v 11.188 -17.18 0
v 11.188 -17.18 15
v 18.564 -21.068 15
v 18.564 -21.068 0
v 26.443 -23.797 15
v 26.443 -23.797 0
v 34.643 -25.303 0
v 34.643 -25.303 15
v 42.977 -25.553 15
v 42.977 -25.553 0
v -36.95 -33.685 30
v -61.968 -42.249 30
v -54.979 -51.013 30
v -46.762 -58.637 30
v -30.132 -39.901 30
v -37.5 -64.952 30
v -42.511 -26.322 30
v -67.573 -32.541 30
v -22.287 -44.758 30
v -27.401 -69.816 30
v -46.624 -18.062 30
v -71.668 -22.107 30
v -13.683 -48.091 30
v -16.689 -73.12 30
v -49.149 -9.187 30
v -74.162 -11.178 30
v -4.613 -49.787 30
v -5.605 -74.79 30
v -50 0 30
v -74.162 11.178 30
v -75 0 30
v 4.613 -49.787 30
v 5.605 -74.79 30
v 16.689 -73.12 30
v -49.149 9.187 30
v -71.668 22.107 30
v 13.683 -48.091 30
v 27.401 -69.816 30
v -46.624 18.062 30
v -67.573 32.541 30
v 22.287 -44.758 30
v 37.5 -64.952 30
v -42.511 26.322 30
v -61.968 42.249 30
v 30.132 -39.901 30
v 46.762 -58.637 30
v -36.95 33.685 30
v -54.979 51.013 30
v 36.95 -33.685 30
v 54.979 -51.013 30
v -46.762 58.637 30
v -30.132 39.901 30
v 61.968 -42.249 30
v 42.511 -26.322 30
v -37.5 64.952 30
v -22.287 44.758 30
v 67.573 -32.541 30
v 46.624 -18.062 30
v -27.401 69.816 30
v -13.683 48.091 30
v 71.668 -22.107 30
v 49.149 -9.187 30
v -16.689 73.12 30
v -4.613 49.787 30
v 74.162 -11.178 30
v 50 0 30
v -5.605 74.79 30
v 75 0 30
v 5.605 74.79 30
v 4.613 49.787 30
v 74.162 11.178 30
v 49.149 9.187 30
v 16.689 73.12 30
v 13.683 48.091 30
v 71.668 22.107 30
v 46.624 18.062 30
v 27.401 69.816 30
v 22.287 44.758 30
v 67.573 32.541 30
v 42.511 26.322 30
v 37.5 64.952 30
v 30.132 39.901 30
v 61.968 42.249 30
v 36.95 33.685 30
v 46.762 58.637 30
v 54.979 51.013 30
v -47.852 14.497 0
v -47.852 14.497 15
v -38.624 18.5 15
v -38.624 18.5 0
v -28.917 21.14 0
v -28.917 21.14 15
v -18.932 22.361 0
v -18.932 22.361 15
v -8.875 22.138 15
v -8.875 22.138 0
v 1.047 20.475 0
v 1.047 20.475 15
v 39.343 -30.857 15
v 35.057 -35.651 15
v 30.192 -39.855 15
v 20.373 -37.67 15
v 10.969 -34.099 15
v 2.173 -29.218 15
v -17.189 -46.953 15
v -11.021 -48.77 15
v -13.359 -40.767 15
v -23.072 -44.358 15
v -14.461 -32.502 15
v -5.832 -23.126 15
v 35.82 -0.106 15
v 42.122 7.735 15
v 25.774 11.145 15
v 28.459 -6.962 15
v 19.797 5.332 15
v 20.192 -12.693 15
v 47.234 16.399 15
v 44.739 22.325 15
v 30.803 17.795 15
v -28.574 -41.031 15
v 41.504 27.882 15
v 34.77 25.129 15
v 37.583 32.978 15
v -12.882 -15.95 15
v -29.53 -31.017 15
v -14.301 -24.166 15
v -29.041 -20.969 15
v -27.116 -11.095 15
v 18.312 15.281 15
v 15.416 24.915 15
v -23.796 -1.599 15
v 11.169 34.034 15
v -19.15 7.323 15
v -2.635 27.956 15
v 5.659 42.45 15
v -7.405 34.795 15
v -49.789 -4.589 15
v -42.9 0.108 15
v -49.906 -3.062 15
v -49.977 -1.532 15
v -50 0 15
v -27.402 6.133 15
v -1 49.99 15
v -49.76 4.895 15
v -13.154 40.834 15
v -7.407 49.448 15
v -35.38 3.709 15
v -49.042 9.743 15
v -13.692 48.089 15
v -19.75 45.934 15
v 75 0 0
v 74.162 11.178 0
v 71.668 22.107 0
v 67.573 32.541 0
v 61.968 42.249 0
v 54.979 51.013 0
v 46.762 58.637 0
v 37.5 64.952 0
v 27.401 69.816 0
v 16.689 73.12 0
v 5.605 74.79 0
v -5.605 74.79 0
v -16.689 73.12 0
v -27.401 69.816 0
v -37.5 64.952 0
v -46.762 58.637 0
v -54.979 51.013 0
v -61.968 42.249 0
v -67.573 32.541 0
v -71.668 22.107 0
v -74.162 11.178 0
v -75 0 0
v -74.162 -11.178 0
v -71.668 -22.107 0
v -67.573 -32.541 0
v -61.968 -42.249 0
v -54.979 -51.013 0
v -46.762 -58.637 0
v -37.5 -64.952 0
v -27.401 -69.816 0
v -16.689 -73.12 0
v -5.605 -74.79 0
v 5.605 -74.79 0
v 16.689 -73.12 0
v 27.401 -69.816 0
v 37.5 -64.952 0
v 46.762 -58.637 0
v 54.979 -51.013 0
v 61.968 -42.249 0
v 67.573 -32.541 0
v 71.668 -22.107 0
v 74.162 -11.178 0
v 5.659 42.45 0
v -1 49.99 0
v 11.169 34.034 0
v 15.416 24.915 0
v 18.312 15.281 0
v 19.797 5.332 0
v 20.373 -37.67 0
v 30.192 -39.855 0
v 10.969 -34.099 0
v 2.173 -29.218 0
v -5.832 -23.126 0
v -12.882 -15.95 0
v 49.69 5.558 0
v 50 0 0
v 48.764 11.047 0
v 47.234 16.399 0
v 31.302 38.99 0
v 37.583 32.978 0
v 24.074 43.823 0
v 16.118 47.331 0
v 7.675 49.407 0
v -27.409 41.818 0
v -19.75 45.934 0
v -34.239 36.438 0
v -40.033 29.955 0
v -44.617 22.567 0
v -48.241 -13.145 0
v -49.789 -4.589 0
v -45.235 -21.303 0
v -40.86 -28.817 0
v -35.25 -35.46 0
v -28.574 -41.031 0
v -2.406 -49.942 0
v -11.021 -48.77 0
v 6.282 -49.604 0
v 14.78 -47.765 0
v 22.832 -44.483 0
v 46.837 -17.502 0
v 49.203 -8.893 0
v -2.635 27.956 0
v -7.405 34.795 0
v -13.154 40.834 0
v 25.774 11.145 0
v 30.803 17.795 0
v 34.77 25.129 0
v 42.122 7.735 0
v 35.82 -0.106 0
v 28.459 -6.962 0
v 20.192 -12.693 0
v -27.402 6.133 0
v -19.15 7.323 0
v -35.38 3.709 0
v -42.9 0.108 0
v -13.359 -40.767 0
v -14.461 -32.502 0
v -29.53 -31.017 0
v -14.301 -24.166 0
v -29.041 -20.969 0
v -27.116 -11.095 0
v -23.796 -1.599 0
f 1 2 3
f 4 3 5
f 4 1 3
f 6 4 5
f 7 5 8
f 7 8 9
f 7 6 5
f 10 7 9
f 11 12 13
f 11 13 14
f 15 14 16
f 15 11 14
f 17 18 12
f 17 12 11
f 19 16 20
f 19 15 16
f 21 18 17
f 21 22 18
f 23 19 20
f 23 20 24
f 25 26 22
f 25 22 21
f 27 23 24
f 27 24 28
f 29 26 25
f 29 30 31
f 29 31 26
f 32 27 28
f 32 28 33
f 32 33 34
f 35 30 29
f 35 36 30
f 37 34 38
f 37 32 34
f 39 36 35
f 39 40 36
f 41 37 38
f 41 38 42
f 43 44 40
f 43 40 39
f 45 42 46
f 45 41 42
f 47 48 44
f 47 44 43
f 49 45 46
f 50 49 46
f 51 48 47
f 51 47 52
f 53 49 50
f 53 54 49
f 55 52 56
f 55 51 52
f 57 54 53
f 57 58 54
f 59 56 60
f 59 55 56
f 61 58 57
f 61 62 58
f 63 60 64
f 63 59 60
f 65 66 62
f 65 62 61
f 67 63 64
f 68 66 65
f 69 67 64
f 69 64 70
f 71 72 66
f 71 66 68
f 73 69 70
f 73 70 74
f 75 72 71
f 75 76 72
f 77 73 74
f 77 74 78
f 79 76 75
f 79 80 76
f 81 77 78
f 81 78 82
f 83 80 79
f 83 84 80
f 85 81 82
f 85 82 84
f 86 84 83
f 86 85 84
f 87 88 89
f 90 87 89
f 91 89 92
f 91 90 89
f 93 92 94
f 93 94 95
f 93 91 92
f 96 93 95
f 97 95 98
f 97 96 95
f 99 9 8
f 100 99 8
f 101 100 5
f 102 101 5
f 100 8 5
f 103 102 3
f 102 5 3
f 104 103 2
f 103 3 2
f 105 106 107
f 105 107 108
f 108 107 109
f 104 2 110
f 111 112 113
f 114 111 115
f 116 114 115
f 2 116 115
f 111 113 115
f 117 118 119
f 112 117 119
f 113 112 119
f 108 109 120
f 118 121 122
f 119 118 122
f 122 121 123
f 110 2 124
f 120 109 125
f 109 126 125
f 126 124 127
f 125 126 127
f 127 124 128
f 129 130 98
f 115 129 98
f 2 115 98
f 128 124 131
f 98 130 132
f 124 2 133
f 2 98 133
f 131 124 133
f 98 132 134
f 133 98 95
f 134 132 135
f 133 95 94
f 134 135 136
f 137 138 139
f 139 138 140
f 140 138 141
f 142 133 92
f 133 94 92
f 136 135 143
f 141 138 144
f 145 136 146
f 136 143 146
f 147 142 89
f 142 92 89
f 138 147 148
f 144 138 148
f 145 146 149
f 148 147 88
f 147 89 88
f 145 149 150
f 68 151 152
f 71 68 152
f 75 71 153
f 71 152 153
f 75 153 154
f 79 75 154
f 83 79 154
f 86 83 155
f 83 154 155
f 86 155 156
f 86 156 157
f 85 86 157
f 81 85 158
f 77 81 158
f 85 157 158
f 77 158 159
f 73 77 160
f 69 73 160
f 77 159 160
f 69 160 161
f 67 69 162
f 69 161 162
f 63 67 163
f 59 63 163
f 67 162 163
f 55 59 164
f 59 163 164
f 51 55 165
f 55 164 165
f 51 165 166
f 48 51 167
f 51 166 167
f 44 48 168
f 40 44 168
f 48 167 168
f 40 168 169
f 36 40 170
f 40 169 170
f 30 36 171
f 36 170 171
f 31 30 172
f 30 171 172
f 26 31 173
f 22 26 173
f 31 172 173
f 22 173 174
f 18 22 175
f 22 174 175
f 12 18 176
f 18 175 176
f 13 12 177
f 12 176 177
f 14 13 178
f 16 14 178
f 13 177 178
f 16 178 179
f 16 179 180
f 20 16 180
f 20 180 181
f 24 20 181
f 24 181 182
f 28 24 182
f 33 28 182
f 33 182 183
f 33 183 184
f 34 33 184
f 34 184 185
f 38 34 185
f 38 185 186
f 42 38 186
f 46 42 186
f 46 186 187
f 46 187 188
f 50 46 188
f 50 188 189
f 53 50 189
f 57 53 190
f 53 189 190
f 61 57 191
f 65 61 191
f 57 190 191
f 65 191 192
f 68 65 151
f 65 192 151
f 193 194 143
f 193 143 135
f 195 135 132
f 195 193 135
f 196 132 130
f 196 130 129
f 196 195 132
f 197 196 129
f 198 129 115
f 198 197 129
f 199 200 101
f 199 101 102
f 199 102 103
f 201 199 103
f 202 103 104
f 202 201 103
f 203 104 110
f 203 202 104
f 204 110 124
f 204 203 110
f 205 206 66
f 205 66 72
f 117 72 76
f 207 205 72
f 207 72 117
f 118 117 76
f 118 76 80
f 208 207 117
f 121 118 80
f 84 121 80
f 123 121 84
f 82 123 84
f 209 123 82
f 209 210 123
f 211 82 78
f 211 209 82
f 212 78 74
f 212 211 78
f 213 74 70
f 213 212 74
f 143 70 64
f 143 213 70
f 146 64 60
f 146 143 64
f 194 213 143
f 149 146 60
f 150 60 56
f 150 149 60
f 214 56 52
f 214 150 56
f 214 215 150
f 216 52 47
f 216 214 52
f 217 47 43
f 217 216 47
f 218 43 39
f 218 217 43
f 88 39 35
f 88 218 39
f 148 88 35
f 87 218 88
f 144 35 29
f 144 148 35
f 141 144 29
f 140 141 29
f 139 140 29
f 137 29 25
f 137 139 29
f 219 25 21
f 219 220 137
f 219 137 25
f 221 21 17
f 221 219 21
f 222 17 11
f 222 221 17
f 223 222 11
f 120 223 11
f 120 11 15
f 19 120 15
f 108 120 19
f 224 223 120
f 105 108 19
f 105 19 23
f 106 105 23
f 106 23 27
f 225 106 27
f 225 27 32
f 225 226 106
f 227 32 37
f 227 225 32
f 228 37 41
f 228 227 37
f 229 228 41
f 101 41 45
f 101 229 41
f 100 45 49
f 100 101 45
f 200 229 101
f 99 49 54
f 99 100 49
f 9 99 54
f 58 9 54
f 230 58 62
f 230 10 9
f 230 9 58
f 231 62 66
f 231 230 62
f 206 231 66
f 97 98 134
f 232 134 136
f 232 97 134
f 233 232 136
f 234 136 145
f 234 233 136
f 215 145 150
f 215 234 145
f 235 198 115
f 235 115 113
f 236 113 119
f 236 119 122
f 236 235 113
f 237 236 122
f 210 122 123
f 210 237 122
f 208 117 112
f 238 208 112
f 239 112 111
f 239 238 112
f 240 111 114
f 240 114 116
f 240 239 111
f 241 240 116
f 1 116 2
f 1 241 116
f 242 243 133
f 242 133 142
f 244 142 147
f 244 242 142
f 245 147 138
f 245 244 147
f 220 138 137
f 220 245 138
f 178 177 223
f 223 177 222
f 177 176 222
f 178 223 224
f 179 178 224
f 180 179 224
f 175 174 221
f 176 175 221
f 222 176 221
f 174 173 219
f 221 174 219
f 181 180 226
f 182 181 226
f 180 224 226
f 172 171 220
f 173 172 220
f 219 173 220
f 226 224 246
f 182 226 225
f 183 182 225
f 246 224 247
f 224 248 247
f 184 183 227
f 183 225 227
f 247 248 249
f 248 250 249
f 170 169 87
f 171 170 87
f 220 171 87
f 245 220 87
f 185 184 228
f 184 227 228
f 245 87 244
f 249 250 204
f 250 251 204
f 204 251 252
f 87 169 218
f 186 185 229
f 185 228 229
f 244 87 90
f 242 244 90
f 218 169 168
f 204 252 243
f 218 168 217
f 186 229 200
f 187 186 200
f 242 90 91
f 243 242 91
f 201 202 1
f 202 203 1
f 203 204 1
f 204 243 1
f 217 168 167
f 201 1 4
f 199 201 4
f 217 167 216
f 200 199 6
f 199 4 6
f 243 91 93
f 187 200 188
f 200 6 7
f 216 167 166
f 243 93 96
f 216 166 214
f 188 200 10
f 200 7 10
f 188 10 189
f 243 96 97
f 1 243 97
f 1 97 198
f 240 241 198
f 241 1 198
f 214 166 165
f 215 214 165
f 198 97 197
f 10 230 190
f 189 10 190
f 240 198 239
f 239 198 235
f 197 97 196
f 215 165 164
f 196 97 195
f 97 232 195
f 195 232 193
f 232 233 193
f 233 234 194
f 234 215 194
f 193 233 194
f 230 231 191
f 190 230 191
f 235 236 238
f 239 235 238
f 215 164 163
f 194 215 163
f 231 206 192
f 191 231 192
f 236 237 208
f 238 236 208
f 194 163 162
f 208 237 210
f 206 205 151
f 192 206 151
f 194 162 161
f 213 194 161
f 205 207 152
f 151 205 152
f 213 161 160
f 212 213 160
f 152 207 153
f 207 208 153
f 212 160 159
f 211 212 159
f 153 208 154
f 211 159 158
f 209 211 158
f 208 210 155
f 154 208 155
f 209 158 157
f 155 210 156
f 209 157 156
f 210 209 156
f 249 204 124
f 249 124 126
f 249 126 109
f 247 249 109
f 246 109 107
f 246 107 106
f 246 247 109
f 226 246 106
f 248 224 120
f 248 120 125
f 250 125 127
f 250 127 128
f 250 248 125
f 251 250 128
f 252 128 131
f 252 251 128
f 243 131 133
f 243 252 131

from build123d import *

# Parameters (mm, degrees)
SKETCH1_R           = 75
SKETCH1_R_2         = 50
BOSS_EXTRUDE1_DEPTH = 30
BOSS_EXTRUDE2_DEPTH = 15


with BuildPart() as part:
    # Sketch1 → Boss-Extrude1 (new body)
    with BuildSketch(Plane.XY):
        Circle(SKETCH1_R)
        Circle(SKETCH1_R_2, mode=Mode.SUBTRACT)
    extrude(amount=BOSS_EXTRUDE1_DEPTH)

    # Sketch2 → Boss-Extrude2 (add)
    with BuildSketch(Plane(origin=(0, 0, 0), x_dir=(-1, 0, 0), z_dir=(0, 0, -1))):
        with BuildLine():
            ThreePointArc((-19.796645951, 5.331811511), (-30.803499375, 17.794882511), (-37.582797631, 32.977770122))
            ThreePointArc((-37.582797631, 32.977770122), (-43.211113504, 25.15550973), (-47.234297303, 16.398815759))
            ThreePointArc((-47.234297303, 16.398815759), (-32.262837592, -3.666350702), (-11.18835411, -17.180108765))
            ThreePointArc((-11.18835411, -17.180108765), (-26.44274376, -23.796947698), (-42.97744633, -25.552673186))
            ThreePointArc((-42.97744633, -25.552673186), (-37.277279866, -33.322731067), (-30.192401169, -39.854973487))
            ThreePointArc((-30.192401169, -39.854973487), (-6.482858375, -31.816746601), (12.881862833, -15.949702657))
            ThreePointArc((12.881862833, -15.949702657), (14.460984976, -32.502205015), (11.021275052, -48.770190652))
            ThreePointArc((11.021275052, -48.770190652), (20.17248754, -45.750090125), (28.57436718, -41.030543992))
            ThreePointArc((28.57436718, -41.030543992), (28.256210772, -15.997480106), (19.149783179, 7.322650414))
            ThreePointArc((19.149783179, 7.322650414), (35.380123986, 3.709480291), (49.788968911, -4.588962272))
            ThreePointArc((49.788968911, -4.588962272), (49.947214365, -2.296906009), (50, 0))
            ThreePointArc((50, 0), (49.460168644, 7.327463252), (47.852331292, 14.496702726))
            ThreePointArc((47.852331292, 14.496702726), (23.946157025, 21.929760162), (-1.046645951, 20.4753495))
            ThreePointArc((-1.046645951, 20.4753495), (7.405134174, 34.794789915), (19.75, 45.934055993))
            ThreePointArc((19.75, 45.934055993), (10.571343028, 48.869691083), (1, 49.989999))
            ThreePointArc((1, 49.989999), (-13.45667183, 29.550817252), (-19.796645951, 5.331811511))
        make_face()
    extrude(amount=-BOSS_EXTRUDE2_DEPTH)


solid = part.part
